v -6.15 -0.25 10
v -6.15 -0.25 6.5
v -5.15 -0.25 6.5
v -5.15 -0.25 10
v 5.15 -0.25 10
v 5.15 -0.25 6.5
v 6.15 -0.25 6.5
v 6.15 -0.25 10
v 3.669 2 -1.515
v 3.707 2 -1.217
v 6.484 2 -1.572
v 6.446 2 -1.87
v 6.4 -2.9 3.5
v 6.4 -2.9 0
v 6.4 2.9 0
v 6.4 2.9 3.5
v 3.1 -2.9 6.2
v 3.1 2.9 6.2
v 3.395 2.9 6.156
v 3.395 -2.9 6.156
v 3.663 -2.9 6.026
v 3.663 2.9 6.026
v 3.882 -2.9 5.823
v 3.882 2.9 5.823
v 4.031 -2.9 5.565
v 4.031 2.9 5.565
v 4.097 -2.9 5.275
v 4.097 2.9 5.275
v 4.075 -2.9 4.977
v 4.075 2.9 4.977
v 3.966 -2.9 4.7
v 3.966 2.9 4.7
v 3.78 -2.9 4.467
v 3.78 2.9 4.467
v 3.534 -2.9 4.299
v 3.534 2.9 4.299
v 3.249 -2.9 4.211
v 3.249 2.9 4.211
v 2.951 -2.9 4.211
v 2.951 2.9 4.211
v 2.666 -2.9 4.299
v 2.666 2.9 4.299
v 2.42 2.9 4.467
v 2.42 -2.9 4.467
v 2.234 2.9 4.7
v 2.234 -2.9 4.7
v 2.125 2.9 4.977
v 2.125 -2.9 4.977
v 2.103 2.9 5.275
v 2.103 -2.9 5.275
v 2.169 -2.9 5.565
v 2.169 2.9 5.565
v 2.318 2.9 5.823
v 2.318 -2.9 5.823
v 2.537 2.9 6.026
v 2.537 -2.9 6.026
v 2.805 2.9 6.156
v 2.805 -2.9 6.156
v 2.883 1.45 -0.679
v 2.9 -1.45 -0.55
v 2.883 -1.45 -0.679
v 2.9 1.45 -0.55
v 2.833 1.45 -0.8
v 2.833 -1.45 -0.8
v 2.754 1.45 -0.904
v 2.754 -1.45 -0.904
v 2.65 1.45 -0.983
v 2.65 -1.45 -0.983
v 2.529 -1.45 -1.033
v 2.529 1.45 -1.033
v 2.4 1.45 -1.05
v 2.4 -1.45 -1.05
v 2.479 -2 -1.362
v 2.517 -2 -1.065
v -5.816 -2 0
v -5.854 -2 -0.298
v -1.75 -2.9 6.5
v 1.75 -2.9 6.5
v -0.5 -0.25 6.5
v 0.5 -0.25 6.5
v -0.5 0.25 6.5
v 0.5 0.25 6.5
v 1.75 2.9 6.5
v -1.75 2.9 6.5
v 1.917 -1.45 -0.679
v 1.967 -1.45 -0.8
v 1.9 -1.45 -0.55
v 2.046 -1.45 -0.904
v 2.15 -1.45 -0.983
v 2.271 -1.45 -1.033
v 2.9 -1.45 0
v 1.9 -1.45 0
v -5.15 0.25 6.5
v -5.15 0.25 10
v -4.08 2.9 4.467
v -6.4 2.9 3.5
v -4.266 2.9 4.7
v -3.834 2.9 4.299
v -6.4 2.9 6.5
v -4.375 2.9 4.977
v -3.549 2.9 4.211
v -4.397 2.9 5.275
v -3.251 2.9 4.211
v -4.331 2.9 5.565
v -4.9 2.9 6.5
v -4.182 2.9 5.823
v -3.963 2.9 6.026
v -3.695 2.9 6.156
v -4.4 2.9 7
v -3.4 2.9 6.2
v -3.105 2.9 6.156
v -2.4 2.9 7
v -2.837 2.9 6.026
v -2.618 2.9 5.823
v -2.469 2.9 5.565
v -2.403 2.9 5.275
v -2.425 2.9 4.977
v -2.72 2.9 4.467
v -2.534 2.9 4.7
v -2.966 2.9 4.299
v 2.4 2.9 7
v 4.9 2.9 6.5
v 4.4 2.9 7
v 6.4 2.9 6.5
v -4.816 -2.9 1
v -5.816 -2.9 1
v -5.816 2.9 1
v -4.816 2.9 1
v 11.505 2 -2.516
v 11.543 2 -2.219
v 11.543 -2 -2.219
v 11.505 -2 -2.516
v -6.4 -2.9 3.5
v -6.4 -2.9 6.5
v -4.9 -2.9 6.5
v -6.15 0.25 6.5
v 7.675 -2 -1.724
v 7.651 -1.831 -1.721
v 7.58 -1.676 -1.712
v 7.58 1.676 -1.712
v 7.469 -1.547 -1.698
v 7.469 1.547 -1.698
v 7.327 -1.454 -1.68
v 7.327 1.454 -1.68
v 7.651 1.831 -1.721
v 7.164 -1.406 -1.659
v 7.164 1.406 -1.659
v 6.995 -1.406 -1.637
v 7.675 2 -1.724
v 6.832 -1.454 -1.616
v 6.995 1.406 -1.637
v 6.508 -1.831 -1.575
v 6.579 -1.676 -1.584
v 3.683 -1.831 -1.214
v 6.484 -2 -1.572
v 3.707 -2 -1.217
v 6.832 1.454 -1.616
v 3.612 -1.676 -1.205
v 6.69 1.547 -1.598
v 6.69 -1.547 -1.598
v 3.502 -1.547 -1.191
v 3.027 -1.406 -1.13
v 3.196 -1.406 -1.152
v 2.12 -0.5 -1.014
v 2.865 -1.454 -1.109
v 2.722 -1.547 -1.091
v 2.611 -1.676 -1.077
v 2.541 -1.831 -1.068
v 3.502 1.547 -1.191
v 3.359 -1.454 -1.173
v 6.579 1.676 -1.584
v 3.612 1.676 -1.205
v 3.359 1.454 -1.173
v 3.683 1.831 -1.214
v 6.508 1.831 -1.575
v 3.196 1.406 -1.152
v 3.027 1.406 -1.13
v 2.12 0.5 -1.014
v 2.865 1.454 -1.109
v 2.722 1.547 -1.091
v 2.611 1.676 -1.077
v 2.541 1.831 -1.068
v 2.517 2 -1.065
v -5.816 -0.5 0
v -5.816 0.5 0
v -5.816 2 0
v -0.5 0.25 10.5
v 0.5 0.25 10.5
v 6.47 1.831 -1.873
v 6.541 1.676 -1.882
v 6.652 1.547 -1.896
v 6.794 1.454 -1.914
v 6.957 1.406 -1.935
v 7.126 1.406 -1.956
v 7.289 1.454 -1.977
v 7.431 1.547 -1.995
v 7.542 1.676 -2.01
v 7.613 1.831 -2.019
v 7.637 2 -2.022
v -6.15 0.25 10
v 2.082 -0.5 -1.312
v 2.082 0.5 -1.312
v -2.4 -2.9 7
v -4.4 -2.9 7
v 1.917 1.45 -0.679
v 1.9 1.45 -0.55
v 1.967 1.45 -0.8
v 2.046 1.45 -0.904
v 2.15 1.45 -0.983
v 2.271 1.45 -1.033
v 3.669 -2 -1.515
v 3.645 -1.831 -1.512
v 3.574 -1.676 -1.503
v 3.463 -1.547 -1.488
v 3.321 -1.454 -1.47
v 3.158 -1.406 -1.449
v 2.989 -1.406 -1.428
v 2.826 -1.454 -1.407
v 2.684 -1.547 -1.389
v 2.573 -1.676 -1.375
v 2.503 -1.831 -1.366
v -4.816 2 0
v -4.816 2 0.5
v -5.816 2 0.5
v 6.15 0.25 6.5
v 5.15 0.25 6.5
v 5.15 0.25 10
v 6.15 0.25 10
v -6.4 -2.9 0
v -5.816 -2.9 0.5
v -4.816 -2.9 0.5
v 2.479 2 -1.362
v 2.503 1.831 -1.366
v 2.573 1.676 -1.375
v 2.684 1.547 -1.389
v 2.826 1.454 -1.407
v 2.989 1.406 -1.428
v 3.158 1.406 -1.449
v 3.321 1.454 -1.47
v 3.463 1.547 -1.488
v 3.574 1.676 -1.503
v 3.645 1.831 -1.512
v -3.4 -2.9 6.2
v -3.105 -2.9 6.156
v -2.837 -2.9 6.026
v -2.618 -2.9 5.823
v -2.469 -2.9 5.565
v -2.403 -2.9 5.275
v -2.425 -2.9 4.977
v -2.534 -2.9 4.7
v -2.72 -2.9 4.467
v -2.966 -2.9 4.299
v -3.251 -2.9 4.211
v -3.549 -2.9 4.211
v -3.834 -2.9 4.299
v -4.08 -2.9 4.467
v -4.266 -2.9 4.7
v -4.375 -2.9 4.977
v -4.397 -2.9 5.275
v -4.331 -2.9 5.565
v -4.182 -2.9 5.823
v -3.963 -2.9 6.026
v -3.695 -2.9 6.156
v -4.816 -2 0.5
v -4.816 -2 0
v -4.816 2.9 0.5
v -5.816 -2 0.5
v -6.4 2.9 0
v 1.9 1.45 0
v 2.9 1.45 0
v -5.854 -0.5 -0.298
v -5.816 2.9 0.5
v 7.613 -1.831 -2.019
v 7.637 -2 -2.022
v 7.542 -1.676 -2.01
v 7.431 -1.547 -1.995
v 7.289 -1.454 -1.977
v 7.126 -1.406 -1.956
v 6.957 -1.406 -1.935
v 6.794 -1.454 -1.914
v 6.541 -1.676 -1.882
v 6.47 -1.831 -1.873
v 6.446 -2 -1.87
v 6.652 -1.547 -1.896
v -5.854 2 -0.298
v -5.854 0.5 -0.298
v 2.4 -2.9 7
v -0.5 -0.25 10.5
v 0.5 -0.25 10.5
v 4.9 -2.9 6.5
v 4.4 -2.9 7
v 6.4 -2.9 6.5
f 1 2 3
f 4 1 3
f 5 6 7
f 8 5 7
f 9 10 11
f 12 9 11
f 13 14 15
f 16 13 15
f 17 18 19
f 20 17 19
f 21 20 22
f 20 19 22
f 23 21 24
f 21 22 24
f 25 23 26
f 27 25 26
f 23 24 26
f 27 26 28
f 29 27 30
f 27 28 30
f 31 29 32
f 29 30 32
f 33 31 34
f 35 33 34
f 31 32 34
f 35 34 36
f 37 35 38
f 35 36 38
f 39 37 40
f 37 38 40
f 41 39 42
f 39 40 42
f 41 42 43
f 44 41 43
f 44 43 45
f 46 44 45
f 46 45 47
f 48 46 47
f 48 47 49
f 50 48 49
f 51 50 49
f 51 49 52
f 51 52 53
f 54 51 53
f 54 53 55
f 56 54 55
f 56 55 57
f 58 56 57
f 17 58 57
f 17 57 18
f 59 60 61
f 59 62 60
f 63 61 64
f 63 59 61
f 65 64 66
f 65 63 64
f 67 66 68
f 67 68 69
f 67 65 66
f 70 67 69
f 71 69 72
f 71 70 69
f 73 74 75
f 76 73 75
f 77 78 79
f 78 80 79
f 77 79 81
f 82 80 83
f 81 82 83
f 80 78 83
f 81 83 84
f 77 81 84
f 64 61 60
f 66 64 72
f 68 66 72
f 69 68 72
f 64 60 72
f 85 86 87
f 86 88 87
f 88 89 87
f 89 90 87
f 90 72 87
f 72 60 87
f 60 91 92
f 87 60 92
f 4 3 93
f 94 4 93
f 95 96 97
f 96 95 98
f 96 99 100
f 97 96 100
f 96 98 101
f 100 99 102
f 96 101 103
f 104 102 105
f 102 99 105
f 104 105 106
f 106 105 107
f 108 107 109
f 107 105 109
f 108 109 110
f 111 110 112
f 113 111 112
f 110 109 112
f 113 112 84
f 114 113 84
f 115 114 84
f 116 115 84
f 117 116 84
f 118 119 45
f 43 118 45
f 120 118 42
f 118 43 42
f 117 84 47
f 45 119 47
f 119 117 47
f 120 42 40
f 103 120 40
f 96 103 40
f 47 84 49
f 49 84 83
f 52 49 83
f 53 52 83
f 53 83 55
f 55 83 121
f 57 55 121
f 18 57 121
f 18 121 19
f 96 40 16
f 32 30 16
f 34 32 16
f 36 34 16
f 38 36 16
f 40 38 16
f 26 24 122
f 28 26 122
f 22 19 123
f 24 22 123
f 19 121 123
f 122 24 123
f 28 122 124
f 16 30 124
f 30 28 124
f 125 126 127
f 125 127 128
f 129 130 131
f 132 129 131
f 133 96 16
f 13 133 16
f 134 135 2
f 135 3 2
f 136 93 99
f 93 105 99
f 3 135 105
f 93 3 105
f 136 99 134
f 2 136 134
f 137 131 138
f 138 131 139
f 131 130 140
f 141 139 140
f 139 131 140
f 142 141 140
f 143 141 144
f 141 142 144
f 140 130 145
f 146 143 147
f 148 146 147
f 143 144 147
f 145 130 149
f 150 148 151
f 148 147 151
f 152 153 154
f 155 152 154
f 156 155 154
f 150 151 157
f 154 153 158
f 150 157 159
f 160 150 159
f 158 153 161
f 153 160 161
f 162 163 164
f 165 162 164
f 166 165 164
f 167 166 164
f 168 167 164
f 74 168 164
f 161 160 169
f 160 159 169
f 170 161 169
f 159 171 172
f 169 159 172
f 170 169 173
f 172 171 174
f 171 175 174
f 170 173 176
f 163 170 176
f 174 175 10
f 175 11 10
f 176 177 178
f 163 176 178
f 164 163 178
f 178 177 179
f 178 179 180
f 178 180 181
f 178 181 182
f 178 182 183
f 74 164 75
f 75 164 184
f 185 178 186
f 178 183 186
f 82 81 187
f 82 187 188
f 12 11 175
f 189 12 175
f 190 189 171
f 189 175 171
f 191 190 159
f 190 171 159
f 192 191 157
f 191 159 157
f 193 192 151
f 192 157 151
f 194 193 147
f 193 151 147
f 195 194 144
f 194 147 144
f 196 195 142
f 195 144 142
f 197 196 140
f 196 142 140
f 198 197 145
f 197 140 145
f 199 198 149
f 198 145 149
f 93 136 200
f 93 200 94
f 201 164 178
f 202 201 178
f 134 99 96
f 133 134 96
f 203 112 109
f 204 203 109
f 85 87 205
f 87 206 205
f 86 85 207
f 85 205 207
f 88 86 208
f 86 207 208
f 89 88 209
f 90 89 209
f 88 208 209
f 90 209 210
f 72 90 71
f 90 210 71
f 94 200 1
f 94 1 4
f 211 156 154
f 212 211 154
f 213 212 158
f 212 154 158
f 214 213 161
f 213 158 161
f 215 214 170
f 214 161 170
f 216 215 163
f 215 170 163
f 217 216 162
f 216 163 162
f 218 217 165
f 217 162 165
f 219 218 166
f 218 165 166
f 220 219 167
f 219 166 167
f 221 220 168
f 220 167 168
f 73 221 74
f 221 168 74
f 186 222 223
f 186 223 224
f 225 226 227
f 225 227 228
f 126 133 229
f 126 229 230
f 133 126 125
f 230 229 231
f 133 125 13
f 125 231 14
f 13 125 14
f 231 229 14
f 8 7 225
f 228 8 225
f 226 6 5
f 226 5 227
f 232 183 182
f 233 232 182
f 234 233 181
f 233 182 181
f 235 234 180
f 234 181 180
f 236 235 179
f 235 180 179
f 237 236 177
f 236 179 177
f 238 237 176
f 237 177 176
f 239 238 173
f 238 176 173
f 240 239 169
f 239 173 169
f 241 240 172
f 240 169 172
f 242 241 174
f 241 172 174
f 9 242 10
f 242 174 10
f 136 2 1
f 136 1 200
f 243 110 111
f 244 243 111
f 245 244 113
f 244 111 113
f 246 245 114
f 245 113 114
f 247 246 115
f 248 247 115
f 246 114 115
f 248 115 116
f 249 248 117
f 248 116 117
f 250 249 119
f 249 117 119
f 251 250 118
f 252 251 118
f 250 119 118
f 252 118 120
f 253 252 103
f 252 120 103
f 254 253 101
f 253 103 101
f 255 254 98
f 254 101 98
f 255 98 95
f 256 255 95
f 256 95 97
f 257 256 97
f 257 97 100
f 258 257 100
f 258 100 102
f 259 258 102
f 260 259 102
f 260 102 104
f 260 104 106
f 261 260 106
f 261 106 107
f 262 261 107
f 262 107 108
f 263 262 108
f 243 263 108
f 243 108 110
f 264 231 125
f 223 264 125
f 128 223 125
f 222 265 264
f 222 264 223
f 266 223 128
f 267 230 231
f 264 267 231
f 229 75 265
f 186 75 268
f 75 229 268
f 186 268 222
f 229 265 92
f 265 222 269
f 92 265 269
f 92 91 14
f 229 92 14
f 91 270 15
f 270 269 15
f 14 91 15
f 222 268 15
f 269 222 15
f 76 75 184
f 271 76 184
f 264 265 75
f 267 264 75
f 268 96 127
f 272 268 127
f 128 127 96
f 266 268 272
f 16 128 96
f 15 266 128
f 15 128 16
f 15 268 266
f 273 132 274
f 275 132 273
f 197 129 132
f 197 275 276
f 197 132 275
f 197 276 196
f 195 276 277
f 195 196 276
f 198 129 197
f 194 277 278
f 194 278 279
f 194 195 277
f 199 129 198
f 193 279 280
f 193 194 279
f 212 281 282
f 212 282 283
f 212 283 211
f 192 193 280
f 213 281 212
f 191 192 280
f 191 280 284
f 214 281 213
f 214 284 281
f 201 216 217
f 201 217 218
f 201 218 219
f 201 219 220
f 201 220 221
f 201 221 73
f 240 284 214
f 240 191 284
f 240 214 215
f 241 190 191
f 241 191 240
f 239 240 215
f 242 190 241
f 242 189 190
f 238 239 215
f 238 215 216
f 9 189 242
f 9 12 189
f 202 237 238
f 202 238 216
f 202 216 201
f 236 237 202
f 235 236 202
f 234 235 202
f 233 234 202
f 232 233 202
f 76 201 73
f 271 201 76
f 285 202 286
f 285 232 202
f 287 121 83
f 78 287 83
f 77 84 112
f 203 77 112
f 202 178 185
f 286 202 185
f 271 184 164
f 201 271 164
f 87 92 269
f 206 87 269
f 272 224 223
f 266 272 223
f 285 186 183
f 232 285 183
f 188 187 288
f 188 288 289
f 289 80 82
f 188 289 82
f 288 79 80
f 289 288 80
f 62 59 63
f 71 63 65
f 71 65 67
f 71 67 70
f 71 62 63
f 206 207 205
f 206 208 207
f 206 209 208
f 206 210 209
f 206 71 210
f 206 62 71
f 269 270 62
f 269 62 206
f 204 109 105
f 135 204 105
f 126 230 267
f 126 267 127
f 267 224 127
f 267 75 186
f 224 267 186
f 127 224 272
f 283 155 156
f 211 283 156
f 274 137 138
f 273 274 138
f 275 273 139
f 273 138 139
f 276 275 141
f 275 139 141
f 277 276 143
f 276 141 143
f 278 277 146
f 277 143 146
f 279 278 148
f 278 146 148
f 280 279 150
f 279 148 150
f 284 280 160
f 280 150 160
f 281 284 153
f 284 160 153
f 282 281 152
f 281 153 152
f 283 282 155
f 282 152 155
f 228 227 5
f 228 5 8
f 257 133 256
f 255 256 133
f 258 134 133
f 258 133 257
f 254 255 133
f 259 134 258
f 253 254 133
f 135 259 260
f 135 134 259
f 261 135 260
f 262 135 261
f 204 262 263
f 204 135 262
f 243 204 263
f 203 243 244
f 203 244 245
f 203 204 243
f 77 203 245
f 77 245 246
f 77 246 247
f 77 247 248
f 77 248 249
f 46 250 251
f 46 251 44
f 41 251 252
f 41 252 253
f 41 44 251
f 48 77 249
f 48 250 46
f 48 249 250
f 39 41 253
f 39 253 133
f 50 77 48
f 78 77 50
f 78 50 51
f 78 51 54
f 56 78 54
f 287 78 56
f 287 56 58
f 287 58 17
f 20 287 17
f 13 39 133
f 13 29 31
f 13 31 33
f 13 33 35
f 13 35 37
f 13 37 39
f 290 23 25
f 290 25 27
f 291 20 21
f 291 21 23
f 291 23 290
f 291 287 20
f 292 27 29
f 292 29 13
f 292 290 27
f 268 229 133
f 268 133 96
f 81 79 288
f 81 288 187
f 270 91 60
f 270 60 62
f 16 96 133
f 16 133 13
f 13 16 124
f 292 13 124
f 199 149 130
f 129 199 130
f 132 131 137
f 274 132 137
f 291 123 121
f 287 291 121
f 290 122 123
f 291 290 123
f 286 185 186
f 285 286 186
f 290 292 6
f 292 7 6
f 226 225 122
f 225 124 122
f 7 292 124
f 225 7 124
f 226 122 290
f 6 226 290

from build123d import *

# Parameters (mm, degrees)
SKETCH_1_W            = 12.8
SKETCH_1_H            = 5.8
EXTRUDE_1_DEPTH       = 3.5
SKETCH_2_W            = 1
SKETCH_2_H            = 2.9
EXTRUDE_2_DEPTH       = 1.05
FILLET_1_R            = 0.5
SKETCH_3_W            = 1
SKETCH_3_H            = 4
CUT_EXTRUDE_1_DEPTH   = 1
SKETCH_4_W            = 1
SKETCH_4_H            = 0.5
CUT_EXTRUDE_2_DEPTH   = 10.31933474
EXTRUDE_110_DEPTH     = 5.8
SKETCH_6_W            = 1
SKETCH_6_H            = 0.5
EXTRUDE_3_DEPTH       = 4
SKETCH_5_W            = 1
SKETCH_5_H            = 0.5
EXTRUDE_210_DEPTH     = 3.5
SKETCH_7_R            = 1
CUT_EXTRUDE_110_DEPTH = 17.293966082
EXTRUDE_212_DEPTH     = 0.3


with BuildPart() as part:
    # Эскиз1 → Вытянуть1 (new body)
    with BuildSketch(Plane.XY):
        Rectangle(SKETCH_1_W, SKETCH_1_H)
    extrude(amount=EXTRUDE_1_DEPTH)

    # Эскиз2 → Вытянуть2 (add)
    with BuildSketch(Plane(origin=(0, 0, 0), x_dir=(-1, 0, 0), z_dir=(0, 0, -1))):
        with Locations((-2.4, 0)):
            Rectangle(SKETCH_2_W, SKETCH_2_H)
    extrude(amount=EXTRUDE_2_DEPTH)

    # Скругление1
    fillet_1_edges = [part.edges().sort_by_distance(p)[0] for p in [
        (2.9, 0, -1.05),
        (1.9, 0, -1.05),
    ]]
    fillet(fillet_1_edges, radius=FILLET_1_R - 0.0001)  # a hair under: the kernel refuses the full size

    # Эскиз3 → Вырез-Вытянуть1 (cut)
    with BuildSketch(Plane(origin=(0, 0, 0), x_dir=(-1, 0, 0), z_dir=(0, 0, -1))):
        with Locations((5.31562156, 0)):
            Rectangle(SKETCH_3_W, SKETCH_3_H)
    extrude(amount=-CUT_EXTRUDE_1_DEPTH, mode=Mode.SUBTRACT)

    # Эскиз4 → Вырез-Вытянуть2 (cut, through all)
    with BuildSketch(Plane.XZ.offset(2.9)):
        with Locations((-5.31562156, 0.75)):
            Rectangle(SKETCH_4_W, SKETCH_4_H)
    extrude(amount=-CUT_EXTRUDE_2_DEPTH, mode=Mode.SUBTRACT)


with BuildPart() as body_2:
    # Эскиз110 → Вытянуть110 (new body)
    with BuildSketch(Plane(origin=(1.592474691, 2.9, -4.760466002), x_dir=(1, 0, 0), z_dir=(0, -1, 0))):
        Polygon((-7.992474691, 8.260466002), (4.807525309, 8.260466002), (4.807525309, 11.260466002), (3.307525309, 11.260466002), (2.807525309, 11.760466002), (0.807525309, 11.760466002), (0.157525309, 11.260466002), (-3.342474691, 11.260466002), (-3.992474691, 11.760466002), (-5.992474691, 11.760466002), (-6.492474691, 11.260466002), (-7.992474691, 11.260466002), align=None)
    extrude(amount=EXTRUDE_110_DEPTH)

    # Эскиз6 → Вытянуть3 (add)
    with BuildSketch(Plane(origin=(-1.592474691, 3.5, 6.5), x_dir=(1, 0, 0), z_dir=(0, 0, 1))):
        with Locations((1.592474691, -3.5)):
            Rectangle(SKETCH_6_W, SKETCH_6_H)
    extrude(amount=EXTRUDE_3_DEPTH)

    # Эскиз5 → Вытянуть210 (add)
    with BuildSketch(Plane(origin=(-1.592474691, 3.5, 6.5), x_dir=(1, 0, 0), z_dir=(0, 0, 1))):
        with Locations((-4.057525309, -3.5)):
            Rectangle(SKETCH_5_W, SKETCH_5_H)
        with Locations((7.242474691, -3.5)):
            Rectangle(SKETCH_5_W, SKETCH_5_H)
    extrude(amount=EXTRUDE_210_DEPTH)

    # Эскиз7 → Вырез-Вытянуть110 (cut, through all)
    with BuildSketch(Plane(origin=(1.592474691, 2.9, -2.460466002), x_dir=(-1, 0, 0), z_dir=(0, 1, 0))):
        with Locations(Location((-1.507525309, 7.660466002, 0), (0, 0, 90))):
            Circle(SKETCH_7_R)
        with Locations(Location((4.992474691, 7.660466002, 0), (0, 0, 90))):
            Circle(SKETCH_7_R)
    extrude(amount=-CUT_EXTRUDE_110_DEPTH, mode=Mode.SUBTRACT)


with BuildPart() as body_3:
    # Эскиз111 → Вытянуть212 (new body)
    with BuildSketch(Plane(origin=(-0.093466794, 0, -0.731321722), x_dir=(-0.9919316118223265, 0, 0.1267741198650638), z_dir=(-0.12677411986506376, 0, -0.9919316118223264))):
        with BuildLine():
            Line((5.768698868, -0.5), (-2.231301132, -0.5))
            Line((-2.231301132, -0.5), (-2.231301132, 0.5))
            Line((-2.231301132, 0.5), (5.768698868, 0.5))
            Line((5.768698868, 0.5), (5.768698868, 2))
            Line((5.768698868, 2), (-2.631301132, 2))
            ThreePointArc((-2.631301132, 2), (-3.231301132, 1.4), (-3.831301132, 2))
            Line((-3.831301132, 2), (-6.631301132, 2))
            ThreePointArc((-6.631301132, 2), (-7.231301132, 1.4), (-7.831301132, 2))
            Line((-7.831301132, 2), (-11.731301132, 2))
            Line((-11.731301132, 2), (-11.731301132, -2))
            Line((-11.731301132, -2), (-7.831301132, -2))
            ThreePointArc((-7.831301132, -2), (-7.231301132, -1.4), (-6.631301132, -2))
            Line((-6.631301132, -2), (-3.831301132, -2))
            ThreePointArc((-3.831301132, -2), (-3.231301132, -1.4), (-2.631301132, -2))
            Line((-2.631301132, -2), (5.768698868, -2))
            Line((5.768698868, -2), (5.768698868, -0.5))
        make_face()
    extrude(amount=EXTRUDE_212_DEPTH)


solid = Compound([part.part, body_2.part, body_3.part])
